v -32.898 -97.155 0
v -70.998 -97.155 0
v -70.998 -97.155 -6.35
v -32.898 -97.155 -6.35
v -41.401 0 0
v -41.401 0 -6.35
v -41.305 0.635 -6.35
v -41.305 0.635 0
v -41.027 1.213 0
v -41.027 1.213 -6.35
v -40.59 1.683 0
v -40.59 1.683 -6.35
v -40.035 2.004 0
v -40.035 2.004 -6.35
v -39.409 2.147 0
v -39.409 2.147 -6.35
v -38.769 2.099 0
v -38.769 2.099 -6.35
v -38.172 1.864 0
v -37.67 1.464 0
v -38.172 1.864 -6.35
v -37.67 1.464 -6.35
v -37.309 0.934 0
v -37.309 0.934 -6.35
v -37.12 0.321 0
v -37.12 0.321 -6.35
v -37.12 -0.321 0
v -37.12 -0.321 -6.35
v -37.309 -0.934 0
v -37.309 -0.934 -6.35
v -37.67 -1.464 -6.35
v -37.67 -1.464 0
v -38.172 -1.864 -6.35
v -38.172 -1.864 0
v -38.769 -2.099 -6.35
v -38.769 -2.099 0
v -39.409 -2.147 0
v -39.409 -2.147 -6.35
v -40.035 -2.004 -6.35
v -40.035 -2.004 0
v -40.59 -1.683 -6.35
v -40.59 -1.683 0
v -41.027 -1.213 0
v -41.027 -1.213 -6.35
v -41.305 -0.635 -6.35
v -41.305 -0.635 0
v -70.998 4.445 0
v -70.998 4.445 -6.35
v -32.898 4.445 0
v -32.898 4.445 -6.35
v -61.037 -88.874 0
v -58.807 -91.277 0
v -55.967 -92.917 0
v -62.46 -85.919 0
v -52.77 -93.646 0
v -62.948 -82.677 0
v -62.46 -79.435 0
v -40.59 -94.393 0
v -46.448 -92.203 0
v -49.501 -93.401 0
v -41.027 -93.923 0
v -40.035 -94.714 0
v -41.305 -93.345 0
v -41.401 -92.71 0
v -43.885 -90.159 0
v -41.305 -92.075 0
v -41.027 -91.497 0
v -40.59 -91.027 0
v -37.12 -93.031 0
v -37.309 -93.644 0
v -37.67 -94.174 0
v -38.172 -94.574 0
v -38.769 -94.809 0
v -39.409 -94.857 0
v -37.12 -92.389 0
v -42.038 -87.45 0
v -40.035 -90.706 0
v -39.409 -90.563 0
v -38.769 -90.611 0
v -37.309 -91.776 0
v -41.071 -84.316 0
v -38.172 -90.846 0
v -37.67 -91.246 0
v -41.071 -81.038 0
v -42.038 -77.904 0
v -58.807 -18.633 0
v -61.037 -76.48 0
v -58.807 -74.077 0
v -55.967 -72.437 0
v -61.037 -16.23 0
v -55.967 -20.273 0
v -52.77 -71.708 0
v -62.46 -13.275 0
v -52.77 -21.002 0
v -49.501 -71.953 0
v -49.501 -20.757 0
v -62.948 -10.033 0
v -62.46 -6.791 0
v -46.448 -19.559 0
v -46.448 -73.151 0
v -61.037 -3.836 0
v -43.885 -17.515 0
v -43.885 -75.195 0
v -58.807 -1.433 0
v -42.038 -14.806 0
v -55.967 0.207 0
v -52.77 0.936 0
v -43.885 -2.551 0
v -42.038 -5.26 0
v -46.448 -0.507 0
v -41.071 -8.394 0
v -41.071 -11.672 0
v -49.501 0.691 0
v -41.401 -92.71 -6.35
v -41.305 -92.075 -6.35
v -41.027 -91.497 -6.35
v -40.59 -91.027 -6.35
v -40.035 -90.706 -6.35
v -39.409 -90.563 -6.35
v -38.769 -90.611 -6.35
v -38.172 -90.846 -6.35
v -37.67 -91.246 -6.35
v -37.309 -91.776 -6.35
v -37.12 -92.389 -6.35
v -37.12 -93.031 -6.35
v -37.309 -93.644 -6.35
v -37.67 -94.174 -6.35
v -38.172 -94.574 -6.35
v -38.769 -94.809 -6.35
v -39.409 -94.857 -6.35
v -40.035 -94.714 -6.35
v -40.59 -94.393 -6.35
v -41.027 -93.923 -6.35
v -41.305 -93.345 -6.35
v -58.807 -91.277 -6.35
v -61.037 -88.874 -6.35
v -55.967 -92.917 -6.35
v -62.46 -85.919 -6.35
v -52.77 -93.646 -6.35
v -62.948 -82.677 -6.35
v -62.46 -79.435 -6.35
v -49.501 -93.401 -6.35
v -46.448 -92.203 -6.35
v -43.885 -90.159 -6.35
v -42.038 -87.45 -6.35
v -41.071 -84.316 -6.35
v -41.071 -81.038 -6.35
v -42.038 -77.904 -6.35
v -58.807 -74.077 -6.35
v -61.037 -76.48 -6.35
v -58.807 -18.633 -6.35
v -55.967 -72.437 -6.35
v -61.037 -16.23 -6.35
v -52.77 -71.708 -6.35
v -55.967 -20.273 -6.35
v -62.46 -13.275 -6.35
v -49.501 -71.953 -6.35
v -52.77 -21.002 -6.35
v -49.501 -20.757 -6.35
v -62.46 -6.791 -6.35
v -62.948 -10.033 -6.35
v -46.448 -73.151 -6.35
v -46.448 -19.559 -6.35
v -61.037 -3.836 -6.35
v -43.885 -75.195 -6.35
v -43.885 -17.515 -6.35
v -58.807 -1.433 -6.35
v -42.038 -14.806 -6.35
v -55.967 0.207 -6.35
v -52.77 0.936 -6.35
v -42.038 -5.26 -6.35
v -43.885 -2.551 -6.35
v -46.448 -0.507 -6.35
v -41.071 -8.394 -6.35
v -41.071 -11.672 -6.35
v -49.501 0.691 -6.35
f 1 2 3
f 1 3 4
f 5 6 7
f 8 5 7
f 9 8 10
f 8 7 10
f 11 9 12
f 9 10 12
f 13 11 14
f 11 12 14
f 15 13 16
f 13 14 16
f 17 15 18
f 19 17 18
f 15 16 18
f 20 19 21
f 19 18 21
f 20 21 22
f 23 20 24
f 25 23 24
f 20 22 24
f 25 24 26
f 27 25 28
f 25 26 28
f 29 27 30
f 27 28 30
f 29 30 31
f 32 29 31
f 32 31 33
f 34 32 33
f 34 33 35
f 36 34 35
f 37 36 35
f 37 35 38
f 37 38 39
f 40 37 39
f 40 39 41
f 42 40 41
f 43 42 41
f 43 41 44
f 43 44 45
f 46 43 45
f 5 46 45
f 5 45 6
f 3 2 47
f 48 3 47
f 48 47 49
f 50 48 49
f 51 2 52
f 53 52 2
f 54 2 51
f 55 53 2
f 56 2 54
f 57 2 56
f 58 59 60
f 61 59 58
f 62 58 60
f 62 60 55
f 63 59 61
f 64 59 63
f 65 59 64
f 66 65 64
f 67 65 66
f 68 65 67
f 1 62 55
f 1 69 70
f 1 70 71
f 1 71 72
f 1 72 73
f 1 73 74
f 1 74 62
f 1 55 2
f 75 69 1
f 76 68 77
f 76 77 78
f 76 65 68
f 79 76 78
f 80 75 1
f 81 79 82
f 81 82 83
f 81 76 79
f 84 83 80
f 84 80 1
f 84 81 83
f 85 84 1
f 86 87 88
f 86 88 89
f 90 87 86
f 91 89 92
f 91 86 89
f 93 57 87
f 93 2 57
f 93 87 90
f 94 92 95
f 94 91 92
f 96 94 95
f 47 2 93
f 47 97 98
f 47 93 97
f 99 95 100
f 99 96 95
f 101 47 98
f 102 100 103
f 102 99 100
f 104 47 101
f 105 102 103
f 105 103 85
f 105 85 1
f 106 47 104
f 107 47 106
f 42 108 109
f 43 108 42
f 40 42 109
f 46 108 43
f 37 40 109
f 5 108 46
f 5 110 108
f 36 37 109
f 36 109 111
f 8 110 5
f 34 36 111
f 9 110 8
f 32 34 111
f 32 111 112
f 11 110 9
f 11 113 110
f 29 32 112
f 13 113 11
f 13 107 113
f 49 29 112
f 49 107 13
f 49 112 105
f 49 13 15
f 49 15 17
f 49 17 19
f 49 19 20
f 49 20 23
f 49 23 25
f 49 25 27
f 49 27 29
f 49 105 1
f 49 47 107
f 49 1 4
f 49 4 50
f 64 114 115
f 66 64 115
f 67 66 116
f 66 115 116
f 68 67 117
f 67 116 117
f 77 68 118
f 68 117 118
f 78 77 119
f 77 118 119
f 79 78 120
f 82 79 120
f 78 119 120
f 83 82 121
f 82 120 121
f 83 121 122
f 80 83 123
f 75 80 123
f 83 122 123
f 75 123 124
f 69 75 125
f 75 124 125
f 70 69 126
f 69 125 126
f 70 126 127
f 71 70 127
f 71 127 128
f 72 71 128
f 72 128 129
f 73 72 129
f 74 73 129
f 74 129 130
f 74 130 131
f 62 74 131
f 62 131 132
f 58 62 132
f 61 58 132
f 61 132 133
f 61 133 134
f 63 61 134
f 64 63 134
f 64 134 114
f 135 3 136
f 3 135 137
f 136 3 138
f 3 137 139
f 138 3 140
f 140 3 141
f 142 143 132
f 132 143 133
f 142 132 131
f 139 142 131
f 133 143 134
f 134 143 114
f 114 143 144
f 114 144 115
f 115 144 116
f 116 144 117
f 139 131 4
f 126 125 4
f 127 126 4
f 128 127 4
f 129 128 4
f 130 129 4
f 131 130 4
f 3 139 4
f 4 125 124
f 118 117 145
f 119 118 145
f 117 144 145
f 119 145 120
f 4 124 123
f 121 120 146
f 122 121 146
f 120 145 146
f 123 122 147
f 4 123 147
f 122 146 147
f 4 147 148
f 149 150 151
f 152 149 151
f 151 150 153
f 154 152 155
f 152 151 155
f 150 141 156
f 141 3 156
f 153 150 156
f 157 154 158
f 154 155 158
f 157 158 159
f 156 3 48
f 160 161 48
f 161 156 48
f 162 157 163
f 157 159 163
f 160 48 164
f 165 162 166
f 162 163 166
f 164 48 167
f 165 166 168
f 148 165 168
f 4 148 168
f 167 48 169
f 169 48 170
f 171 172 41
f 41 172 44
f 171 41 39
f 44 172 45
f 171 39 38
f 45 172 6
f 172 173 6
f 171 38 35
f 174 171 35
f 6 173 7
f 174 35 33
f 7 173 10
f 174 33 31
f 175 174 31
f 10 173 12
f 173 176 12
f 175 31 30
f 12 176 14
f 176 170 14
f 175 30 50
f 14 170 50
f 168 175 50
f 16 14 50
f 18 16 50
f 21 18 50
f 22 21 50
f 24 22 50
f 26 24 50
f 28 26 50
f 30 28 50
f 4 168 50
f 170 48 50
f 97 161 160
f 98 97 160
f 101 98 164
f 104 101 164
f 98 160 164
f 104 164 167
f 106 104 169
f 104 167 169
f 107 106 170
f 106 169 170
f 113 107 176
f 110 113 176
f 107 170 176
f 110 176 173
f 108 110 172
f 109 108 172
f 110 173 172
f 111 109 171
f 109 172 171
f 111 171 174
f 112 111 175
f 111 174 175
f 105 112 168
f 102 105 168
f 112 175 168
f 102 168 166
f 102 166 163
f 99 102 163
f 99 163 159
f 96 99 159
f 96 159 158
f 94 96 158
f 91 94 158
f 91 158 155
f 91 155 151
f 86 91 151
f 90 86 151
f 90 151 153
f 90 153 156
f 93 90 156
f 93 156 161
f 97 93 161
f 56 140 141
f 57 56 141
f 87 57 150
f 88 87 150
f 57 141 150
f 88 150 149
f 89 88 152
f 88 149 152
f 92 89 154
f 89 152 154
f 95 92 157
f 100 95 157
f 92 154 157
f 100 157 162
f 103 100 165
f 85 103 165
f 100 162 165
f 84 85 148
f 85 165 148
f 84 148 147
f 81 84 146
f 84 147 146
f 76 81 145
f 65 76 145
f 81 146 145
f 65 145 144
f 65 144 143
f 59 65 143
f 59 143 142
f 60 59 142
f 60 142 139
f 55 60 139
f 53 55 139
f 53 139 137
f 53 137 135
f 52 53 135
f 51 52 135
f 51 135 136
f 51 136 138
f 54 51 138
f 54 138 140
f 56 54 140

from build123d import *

# Parameters (mm, degrees)
F0_W     = 38.1
F0_H     = 101.6
F1_DEPTH = 6.35
F2_D     = 22
F3_D     = 4.3053


with BuildPart() as f1:
    # F0 (on Top) → F1 (new body)
    with BuildSketch(Plane.XY):
        with Locations((-51.9482906996, -46.355)):
            Rectangle(F0_W, F0_H)
    extrude(amount=-F1_DEPTH)

    # F2 (through all)
    with Locations(Plane.XY):
        with Locations((-51.9482906996, -10.033), (-51.9482906996, -82.677)):
            Hole(F2_D / 2)

    # F3 (through all)
    with Locations(Plane.XY):
        with Locations((-39.2482906996, 0), (-39.2482906996, -92.71)):
            Hole(F3_D / 2)


solid = f1.part
